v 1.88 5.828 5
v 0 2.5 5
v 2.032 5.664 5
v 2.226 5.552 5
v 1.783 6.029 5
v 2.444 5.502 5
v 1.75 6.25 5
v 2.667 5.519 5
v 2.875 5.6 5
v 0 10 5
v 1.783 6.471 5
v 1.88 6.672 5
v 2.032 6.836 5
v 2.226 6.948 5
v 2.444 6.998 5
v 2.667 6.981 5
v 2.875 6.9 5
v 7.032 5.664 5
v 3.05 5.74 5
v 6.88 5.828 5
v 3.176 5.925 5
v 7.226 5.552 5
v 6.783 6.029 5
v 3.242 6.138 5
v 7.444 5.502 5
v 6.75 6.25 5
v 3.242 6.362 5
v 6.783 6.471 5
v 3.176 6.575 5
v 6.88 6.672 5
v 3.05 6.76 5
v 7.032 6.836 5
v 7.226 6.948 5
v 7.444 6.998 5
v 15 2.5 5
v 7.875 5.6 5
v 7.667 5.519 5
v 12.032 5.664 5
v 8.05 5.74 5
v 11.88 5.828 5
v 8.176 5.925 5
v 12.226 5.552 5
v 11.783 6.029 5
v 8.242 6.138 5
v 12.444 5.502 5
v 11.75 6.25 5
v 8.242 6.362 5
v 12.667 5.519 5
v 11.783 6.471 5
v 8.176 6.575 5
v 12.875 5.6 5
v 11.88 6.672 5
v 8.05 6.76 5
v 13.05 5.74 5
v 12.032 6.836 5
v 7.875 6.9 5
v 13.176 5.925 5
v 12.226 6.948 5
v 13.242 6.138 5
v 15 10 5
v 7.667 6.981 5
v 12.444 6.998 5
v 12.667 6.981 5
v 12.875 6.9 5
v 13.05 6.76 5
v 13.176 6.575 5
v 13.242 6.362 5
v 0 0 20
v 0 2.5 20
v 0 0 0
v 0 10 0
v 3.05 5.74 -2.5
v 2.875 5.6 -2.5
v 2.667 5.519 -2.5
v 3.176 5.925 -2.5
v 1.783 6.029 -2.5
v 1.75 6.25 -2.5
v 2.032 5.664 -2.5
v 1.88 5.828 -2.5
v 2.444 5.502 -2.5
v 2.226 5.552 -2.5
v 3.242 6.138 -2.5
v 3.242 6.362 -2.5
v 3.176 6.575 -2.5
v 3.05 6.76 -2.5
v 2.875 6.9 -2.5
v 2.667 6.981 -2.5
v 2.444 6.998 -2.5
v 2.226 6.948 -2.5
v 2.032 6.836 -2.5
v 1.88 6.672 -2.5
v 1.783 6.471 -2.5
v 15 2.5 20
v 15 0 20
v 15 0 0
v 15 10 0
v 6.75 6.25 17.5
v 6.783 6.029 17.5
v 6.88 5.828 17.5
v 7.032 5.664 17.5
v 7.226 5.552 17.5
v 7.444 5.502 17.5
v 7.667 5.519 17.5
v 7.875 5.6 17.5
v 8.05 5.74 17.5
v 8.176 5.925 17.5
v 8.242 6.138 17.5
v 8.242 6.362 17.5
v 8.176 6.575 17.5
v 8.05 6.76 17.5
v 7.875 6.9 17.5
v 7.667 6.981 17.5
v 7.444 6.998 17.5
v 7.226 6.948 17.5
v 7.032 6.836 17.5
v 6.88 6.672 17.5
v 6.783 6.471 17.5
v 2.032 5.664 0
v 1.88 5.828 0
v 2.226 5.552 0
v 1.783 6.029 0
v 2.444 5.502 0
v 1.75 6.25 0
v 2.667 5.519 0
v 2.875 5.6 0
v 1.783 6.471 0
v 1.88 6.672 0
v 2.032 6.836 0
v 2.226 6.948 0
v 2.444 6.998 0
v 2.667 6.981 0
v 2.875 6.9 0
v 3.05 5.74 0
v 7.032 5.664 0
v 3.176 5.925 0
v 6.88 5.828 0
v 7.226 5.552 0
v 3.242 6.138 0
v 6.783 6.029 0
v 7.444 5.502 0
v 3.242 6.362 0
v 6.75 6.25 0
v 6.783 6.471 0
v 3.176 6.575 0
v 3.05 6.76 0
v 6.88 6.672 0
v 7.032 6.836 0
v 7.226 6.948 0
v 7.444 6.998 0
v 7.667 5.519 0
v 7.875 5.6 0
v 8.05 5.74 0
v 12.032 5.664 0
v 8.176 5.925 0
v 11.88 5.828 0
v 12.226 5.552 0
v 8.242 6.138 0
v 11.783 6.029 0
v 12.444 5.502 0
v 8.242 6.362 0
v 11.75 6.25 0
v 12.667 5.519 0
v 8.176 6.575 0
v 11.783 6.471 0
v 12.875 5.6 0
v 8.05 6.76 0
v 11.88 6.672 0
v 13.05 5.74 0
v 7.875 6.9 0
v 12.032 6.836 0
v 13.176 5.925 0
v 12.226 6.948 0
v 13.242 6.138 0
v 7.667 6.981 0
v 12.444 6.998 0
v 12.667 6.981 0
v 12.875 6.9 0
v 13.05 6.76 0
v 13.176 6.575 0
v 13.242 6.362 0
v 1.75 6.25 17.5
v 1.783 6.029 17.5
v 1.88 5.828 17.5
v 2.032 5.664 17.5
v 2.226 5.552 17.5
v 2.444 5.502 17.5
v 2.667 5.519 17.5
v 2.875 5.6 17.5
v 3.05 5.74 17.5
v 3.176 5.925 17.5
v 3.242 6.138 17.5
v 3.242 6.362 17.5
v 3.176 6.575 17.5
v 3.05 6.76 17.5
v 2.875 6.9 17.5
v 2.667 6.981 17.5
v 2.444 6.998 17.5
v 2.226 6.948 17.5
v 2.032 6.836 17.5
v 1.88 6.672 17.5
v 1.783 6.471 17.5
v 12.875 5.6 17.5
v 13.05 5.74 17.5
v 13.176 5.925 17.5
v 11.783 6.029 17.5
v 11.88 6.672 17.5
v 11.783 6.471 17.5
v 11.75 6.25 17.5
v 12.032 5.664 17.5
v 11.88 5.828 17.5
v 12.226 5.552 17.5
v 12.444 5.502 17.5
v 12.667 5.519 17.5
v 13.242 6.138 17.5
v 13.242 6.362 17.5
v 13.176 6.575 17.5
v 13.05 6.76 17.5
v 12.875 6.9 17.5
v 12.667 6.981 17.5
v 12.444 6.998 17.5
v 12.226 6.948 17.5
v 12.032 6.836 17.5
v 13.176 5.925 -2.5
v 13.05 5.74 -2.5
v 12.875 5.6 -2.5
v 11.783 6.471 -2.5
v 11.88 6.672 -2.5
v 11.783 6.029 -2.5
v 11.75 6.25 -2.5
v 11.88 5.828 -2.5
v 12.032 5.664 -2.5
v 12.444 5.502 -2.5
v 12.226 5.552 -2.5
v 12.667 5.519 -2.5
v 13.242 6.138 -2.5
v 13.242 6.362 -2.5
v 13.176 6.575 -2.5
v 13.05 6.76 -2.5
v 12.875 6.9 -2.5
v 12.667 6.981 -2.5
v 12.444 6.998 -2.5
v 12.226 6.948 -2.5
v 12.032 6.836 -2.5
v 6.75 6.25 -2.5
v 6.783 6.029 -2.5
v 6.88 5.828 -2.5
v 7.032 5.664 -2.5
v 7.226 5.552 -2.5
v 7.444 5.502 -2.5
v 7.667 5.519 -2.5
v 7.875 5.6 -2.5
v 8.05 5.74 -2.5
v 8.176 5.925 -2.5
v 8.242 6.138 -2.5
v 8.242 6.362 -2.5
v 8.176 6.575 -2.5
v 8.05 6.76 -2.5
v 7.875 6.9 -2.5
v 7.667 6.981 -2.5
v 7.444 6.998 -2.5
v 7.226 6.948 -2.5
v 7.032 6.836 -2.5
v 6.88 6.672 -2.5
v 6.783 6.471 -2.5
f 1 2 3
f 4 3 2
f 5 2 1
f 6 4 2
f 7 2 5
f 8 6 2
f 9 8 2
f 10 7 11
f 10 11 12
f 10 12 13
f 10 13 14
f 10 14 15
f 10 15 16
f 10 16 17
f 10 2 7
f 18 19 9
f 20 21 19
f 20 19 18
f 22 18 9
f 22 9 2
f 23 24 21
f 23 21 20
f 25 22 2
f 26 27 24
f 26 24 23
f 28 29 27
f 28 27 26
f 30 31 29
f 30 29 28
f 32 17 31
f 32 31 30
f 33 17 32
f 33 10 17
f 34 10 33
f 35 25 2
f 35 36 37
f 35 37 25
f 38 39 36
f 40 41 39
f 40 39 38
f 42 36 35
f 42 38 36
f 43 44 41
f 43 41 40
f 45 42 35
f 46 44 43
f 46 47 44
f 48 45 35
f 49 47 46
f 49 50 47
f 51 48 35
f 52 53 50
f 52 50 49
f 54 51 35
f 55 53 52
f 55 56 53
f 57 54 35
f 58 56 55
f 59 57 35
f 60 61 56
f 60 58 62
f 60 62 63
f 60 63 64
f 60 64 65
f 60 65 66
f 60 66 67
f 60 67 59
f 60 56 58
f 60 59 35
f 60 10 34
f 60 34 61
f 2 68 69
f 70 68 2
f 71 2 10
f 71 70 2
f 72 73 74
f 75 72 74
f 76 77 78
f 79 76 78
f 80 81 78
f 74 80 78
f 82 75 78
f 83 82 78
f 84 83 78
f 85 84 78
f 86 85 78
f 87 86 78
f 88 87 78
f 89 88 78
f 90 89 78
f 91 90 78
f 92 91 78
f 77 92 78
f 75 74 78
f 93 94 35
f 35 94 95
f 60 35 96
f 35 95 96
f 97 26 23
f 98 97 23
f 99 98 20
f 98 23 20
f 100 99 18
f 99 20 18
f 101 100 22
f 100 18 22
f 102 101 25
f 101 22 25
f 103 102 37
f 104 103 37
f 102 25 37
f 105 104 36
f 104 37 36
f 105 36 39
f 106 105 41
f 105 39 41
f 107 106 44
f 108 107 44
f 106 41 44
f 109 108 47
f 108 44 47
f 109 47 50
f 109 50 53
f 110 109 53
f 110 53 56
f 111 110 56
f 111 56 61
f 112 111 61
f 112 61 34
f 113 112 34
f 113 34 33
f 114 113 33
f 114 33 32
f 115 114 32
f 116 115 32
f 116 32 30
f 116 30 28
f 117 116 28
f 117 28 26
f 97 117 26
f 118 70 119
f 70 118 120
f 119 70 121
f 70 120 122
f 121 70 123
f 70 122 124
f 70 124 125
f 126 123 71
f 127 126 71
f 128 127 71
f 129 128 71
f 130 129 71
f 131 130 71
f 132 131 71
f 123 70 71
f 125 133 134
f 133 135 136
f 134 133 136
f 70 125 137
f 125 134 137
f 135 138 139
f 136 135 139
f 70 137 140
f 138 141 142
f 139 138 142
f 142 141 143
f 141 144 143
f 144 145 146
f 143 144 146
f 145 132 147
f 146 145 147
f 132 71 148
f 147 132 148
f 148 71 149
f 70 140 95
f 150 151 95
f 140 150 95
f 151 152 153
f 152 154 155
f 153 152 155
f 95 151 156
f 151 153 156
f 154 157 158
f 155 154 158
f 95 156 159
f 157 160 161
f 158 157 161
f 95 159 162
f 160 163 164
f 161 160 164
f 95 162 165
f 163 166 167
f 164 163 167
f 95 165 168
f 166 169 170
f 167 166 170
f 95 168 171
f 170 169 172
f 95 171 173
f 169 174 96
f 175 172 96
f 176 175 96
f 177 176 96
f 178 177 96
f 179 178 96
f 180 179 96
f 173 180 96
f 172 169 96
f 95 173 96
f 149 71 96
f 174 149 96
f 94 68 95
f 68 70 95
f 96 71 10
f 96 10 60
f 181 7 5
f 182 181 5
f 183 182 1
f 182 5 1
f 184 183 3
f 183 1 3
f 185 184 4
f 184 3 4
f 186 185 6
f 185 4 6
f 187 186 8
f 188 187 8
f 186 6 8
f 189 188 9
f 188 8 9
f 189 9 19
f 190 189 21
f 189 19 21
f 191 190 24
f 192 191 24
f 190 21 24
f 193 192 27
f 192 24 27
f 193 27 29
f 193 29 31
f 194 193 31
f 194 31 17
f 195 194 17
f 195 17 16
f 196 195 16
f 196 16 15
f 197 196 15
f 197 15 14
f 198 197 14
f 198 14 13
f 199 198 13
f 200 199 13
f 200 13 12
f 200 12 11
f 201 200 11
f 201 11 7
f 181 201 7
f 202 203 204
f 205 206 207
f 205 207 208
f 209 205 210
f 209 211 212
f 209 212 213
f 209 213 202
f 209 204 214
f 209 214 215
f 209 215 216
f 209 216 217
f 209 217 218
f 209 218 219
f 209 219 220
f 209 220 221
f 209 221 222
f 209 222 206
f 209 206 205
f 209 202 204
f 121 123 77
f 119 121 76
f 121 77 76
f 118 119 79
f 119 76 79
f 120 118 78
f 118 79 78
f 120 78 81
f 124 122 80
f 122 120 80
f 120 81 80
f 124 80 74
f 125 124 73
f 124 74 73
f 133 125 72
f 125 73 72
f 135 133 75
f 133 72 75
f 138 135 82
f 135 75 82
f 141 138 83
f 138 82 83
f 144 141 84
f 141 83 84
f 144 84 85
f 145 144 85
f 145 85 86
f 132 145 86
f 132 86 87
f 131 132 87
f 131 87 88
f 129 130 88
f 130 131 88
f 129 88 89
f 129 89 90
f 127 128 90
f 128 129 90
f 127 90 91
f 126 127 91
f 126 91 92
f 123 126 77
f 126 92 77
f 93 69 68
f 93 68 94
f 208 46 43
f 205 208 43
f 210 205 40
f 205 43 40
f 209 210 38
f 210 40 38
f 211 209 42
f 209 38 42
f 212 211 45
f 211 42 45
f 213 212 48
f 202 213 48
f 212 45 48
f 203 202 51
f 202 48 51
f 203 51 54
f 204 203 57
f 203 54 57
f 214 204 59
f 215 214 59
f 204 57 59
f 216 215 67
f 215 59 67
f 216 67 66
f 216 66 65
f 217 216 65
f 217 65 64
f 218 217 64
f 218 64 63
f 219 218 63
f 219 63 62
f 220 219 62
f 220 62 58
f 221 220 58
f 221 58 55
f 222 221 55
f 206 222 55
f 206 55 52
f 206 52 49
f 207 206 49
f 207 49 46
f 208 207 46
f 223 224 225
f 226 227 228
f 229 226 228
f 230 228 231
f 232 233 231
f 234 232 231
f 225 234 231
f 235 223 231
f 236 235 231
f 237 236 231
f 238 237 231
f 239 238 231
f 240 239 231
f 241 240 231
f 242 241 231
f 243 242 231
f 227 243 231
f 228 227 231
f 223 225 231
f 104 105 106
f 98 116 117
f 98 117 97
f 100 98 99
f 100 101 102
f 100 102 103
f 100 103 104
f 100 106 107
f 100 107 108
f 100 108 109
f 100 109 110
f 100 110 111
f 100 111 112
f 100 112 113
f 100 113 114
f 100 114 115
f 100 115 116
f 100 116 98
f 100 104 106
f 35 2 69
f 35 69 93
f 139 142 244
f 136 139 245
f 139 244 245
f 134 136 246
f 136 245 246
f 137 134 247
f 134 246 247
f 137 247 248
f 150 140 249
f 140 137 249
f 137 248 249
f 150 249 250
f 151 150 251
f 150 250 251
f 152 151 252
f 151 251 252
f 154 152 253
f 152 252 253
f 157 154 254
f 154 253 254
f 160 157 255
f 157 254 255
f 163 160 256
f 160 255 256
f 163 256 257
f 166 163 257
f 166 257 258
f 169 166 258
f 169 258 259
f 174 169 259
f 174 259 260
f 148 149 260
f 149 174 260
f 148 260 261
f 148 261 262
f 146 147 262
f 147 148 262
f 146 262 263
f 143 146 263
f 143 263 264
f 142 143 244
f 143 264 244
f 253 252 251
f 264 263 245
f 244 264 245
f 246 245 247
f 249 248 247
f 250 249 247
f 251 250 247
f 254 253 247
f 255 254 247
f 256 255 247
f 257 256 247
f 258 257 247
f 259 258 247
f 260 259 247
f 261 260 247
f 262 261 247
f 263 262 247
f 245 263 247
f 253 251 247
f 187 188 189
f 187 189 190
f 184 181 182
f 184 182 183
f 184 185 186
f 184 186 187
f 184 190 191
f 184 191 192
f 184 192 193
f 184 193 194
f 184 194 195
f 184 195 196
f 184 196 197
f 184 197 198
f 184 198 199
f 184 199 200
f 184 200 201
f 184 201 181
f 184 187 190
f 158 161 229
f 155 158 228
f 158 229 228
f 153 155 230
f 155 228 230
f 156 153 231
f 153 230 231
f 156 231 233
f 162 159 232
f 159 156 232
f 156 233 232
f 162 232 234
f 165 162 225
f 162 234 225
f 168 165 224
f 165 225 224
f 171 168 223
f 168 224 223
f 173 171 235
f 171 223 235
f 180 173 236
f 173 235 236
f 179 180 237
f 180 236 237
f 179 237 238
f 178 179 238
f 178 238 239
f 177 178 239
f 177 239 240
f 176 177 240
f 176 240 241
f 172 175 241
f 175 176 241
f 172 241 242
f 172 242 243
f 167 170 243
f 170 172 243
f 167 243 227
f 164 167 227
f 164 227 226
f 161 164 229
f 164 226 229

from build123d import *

# Parameters (mm, degrees)
SKETCH_1_W           = 15
SKETCH_1_H           = 10
EXTRUDE_1_DEPTH      = 5
SKETCH_2_W           = 15
SKETCH_2_H           = 2.5
EXTRUDE_2_DEPTH      = 15
EXTRUDE_3_DEPTH      = 12.5
EXTRUDE_3_DEPTH_BACK = 7.5
SKETCH_3_R           = 0.75


with BuildPart() as part:
    # Эскиз1 → Вытянуть1 (new body)
    with BuildSketch(Plane.XY):
        with Locations((7.5, 5)):
            Rectangle(SKETCH_1_W, SKETCH_1_H)
    extrude(amount=EXTRUDE_1_DEPTH)

    # Эскиз2 → Вытянуть2 (add)
    with BuildSketch(Plane.XY.offset(5)):
        with Locations((7.5, 1.25)):
            Rectangle(SKETCH_2_W, SKETCH_2_H)
    extrude(amount=EXTRUDE_2_DEPTH)

    # Эскиз3 → Вытянуть3 (add, two sides: drawn at the far end of the back side and taken through both)
    with BuildSketch(Plane.XY.offset(5).offset(-EXTRUDE_3_DEPTH_BACK)):
        with Locations((7.5, 6.25)):
            Circle(SKETCH_3_R)
        with Locations((12.5, 6.25)):
            Circle(SKETCH_3_R)
        with Locations((2.5, 6.25)):
            Circle(SKETCH_3_R)
    extrude(amount=EXTRUDE_3_DEPTH + EXTRUDE_3_DEPTH_BACK)


solid = part.part
